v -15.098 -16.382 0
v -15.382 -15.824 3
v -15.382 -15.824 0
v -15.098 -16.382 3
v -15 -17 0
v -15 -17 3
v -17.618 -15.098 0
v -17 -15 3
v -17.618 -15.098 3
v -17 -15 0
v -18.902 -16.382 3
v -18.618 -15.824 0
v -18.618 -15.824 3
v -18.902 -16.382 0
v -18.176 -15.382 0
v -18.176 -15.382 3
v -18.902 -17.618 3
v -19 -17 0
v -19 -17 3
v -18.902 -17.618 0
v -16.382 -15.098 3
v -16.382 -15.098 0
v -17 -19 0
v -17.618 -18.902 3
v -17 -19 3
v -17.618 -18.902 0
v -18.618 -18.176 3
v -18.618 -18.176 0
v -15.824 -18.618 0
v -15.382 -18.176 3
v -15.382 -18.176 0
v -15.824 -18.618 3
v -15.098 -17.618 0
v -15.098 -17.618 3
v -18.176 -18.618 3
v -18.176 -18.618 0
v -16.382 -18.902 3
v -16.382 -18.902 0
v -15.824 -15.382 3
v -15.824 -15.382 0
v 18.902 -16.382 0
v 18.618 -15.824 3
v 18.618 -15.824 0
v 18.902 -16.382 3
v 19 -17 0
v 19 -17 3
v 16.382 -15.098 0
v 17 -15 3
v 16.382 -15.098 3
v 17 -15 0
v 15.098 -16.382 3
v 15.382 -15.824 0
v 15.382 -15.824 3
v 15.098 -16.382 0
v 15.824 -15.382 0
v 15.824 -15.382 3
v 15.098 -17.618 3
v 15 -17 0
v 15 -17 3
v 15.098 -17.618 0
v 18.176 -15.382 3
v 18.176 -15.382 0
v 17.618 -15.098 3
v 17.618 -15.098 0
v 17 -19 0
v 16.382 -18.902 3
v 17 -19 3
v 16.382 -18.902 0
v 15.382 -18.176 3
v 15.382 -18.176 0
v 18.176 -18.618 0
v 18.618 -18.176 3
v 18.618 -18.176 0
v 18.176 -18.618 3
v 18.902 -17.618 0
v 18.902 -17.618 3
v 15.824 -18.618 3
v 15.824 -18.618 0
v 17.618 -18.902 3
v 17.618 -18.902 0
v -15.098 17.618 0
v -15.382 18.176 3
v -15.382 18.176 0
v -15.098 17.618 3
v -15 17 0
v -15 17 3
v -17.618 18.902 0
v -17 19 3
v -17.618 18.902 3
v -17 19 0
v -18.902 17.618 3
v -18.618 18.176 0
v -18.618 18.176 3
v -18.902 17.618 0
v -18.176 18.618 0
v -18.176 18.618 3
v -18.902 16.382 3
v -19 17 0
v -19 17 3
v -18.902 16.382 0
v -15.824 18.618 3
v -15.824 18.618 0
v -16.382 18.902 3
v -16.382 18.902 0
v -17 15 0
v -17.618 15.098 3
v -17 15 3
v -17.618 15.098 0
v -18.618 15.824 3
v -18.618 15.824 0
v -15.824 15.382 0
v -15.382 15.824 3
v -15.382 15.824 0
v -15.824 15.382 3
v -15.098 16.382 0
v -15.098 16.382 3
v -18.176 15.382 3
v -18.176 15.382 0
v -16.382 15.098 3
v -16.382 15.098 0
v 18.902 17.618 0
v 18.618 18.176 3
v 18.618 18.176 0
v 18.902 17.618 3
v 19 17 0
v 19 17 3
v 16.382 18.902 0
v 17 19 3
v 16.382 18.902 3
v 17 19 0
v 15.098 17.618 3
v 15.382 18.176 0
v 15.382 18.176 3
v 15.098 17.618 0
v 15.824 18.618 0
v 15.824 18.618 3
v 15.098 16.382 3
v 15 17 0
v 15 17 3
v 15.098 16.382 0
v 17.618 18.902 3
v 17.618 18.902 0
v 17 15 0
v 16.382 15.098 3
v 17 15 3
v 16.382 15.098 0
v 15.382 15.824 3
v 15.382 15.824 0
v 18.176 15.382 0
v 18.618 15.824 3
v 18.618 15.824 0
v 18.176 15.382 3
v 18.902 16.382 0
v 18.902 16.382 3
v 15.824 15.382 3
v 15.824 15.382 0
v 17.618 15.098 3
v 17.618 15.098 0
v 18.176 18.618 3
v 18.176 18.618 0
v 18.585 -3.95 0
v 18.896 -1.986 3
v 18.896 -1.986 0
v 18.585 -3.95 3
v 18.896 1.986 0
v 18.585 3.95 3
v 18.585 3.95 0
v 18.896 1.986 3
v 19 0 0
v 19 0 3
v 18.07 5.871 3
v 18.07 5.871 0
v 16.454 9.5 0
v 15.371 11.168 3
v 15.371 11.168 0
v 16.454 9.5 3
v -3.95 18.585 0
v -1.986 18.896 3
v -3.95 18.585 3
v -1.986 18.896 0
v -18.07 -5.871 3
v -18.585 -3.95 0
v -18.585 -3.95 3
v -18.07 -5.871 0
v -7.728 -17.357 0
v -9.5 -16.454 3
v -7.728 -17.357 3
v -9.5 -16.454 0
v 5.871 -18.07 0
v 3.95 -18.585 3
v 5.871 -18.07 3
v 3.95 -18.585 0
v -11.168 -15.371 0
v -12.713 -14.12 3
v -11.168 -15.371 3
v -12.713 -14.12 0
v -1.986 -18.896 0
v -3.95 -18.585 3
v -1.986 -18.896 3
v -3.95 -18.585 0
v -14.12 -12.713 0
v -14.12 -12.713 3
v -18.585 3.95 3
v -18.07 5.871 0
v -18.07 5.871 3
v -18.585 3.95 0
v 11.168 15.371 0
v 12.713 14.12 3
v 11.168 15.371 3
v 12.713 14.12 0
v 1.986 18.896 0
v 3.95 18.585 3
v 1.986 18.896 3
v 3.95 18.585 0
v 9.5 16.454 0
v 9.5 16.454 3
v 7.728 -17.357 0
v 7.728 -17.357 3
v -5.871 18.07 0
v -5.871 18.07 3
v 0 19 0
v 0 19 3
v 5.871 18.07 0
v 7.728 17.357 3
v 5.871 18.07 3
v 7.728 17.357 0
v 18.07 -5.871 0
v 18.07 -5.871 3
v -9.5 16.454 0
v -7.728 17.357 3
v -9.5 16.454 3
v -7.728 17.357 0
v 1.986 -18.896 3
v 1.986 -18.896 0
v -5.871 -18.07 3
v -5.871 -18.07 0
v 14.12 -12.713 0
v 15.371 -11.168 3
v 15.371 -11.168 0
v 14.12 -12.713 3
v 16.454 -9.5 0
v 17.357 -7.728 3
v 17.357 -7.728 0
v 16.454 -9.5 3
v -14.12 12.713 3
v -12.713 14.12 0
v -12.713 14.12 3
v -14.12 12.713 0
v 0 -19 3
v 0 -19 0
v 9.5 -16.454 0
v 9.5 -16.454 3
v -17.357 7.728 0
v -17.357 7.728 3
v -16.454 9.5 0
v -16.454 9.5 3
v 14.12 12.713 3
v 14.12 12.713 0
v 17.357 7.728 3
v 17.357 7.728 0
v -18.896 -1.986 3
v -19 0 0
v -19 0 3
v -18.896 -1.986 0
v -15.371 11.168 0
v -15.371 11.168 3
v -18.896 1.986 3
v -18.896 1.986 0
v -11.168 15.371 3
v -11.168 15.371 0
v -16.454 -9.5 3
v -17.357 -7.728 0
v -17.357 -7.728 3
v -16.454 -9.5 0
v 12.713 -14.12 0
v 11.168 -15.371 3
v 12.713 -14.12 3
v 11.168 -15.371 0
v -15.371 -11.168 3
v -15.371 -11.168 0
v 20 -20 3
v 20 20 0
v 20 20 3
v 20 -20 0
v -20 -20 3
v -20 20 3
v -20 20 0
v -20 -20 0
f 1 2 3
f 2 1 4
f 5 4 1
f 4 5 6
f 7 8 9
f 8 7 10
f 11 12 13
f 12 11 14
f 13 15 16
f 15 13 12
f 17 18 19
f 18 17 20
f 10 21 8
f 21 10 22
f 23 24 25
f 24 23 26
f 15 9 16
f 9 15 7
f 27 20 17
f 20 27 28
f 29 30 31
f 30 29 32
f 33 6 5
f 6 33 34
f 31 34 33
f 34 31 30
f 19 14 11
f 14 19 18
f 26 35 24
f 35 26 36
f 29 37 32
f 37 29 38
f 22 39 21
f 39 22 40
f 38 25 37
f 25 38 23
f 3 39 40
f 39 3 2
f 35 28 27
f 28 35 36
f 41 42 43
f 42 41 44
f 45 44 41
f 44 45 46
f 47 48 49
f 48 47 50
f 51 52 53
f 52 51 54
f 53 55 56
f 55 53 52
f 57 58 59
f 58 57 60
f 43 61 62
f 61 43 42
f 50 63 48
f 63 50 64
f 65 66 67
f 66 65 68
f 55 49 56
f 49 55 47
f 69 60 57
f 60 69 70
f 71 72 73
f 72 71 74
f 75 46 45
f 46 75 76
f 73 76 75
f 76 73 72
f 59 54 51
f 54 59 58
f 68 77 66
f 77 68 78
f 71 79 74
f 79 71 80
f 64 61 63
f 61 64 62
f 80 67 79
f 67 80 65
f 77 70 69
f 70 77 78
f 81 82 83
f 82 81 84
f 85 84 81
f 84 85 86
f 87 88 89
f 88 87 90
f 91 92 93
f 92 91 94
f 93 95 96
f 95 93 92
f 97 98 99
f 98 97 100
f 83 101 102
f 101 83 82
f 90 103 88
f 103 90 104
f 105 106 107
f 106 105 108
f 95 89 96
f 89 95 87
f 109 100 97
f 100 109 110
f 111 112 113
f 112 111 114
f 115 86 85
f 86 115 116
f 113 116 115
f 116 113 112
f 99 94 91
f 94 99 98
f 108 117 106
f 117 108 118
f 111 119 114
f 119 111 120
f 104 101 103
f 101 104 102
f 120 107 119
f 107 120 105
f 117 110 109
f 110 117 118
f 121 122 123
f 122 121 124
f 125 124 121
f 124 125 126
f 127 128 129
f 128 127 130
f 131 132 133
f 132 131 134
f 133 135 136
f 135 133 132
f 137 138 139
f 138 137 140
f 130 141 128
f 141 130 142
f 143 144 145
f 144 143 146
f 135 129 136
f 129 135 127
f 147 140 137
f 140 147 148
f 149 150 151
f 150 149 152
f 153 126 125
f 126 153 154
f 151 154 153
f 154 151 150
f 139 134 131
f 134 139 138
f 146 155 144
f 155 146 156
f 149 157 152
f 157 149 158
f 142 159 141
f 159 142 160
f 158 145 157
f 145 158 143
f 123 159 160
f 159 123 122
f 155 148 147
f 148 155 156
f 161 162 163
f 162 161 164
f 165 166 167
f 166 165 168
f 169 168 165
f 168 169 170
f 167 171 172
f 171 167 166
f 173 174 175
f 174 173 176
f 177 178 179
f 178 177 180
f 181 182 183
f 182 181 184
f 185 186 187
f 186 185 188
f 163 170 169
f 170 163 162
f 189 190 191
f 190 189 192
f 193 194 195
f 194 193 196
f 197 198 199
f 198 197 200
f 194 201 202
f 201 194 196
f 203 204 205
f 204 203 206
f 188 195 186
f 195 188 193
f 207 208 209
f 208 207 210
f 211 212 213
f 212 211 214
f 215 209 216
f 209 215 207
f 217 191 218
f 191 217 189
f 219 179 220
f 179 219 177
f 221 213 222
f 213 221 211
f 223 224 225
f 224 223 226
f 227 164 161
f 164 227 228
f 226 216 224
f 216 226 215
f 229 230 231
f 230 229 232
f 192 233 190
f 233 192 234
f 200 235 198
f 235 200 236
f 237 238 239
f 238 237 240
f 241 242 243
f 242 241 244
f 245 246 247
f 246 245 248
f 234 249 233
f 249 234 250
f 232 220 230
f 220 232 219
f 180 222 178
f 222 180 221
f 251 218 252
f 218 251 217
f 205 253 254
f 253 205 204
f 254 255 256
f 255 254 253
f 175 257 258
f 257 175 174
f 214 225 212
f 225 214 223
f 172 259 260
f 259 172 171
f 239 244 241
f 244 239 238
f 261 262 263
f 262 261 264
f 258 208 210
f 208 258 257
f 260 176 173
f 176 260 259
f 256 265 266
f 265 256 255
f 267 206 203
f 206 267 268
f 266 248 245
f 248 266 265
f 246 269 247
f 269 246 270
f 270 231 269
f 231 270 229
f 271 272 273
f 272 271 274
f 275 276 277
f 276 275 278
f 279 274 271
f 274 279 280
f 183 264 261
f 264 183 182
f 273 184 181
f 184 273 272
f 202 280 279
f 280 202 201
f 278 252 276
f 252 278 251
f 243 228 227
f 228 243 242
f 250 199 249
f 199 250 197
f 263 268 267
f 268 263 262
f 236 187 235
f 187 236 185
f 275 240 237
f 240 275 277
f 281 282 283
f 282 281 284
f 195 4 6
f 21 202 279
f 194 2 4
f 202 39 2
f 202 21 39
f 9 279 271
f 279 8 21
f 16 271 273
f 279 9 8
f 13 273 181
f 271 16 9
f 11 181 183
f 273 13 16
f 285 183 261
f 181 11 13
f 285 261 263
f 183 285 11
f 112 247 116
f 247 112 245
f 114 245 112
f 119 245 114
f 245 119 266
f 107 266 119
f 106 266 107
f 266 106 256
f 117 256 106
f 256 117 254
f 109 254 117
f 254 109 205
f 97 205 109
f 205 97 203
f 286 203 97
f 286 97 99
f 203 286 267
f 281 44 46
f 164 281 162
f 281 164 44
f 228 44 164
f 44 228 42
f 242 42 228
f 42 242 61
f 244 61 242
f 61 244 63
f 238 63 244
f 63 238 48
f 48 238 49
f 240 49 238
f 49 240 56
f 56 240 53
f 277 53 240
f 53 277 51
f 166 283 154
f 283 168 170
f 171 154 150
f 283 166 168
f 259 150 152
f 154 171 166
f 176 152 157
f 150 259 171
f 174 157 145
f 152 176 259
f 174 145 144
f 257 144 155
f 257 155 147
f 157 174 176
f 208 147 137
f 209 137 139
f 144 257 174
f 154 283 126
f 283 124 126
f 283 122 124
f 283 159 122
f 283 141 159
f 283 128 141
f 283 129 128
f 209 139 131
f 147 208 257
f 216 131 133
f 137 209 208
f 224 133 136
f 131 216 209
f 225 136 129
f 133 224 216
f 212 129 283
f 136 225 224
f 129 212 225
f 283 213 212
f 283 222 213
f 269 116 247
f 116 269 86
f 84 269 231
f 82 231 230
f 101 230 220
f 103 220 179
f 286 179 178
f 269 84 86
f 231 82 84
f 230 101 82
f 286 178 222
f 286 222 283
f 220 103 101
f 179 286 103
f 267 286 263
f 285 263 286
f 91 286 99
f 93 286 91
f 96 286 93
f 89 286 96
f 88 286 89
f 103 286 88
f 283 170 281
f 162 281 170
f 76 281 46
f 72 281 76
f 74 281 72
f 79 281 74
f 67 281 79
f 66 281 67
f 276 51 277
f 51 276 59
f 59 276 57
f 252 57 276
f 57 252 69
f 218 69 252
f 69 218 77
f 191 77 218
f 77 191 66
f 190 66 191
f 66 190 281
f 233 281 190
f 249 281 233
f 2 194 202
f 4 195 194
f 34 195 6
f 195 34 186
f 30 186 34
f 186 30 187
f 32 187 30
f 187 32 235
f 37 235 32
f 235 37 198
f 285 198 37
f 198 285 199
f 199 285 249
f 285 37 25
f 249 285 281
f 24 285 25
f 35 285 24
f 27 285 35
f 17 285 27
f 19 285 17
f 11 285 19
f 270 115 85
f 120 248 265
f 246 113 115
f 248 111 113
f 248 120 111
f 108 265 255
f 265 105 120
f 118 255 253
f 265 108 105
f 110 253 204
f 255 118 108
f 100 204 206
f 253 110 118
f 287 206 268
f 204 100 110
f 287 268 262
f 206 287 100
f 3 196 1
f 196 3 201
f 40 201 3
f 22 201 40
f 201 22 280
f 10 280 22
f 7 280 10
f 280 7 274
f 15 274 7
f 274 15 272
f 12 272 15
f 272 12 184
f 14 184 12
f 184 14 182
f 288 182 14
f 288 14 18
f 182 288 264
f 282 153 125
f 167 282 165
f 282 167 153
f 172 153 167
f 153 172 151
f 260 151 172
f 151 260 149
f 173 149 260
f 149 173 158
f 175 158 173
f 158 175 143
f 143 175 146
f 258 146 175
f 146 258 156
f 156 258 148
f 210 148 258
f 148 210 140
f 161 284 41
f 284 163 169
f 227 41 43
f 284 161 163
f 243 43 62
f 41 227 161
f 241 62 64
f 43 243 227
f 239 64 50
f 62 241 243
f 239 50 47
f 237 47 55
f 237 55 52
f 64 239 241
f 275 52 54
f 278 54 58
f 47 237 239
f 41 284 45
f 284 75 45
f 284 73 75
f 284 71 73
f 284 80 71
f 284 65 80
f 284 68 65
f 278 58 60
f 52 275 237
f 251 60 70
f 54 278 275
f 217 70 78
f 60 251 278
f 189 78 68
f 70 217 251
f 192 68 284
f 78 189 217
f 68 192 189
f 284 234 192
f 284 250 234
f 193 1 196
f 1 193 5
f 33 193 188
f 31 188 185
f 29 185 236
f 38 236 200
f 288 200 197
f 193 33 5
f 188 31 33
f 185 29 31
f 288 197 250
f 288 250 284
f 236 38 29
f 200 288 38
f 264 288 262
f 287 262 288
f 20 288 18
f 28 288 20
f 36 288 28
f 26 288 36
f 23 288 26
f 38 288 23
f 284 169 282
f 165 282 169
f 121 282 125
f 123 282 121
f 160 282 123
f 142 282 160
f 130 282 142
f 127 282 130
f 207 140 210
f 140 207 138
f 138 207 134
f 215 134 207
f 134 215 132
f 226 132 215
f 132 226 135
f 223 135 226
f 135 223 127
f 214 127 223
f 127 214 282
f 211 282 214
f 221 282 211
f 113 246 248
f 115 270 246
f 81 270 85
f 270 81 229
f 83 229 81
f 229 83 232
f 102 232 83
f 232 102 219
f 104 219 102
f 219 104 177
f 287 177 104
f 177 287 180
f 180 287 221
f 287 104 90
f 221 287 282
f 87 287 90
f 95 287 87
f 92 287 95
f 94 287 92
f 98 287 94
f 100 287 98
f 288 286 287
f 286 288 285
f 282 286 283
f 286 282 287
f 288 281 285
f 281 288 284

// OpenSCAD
// file: ../math/vect.scad
function vect_scalar_sum(v, incr) = [for (i = [0: len(v) - 1]) v[i] + incr];

function vSize(size) = (!is_list(size)) ? [size, size, size]: size; 
// file: ../math/align.scad
use <vect.scad>
module align_center(sizes, center = true, centerZ = false){
    sizes = vSize(sizes);
    if (center){
        translate([-sizes[0] / 2, -sizes[1] / 2, (centerZ ? -sizes[2]/2 : 0)]){
            children();
        }
    } else {
        children();
    }   
}

module align_uncenter(sizes, uncenter = true, uncenterZ = false){
    sizes = vSize(sizes);
    if (uncenter){
        translate([sizes[0] / 2, sizes[1] / 2, (centerZ ? sizes[2]/2 : 0)]){
            children();
        }
    } else {
        children();
    }   
}


// align_center(20){
//     align_uncenter(20){
//         cube(20);
//     }
// }
// main file
h = 50;
poly_n = 20;
use <../math/align.scad>;

module cooler_screw_holes(sizes, hole_d, height = h){
    r = hole_d / 2;
    align_center(sizes){
        translate([r, r, 0]){
            cylinder(sizes[2], r1 = r, r2 = r, center = false, $fn=poly_n);
        }
        translate([sizes[0] - r, r, 0]){
            cylinder(sizes[2], r1 = r, r2 = r, center = false, $fn=poly_n);
        }
        translate([r, sizes[1] - r, 0]){
            cylinder(sizes[2], r1 = r, r2 = r, center = false, $fn=poly_n);
        }
        translate([sizes[0] - r, sizes[1] - r, 0]){
            cylinder(sizes[2], r1 = r, r2 = r, center = false, $fn=poly_n);
        }
    }
}


function _map_sizes(size) =
    (size == 40) ? [38, 38, 4]:
    (size == 50) ? [48, 48, 4]: -1;

module cooler_main_hole(r){
    cylinder(h, r / 2, r / 2, $fn=poly_n * 3);
}

module standard_cooler_screw_holes(size){
    size = _map_sizes(size);
    group(){
        cooler_screw_holes([size[0], size[0], h], size[2]);
        cooler_main_hole(size[1]);
    }
}

module standard_cooler_plate(size, h=3){
    difference(){
        align_center(size){
            cube([size, size, h]);
        }
        translate([0,0, -1]){
            standard_cooler_screw_holes(size);
        }
    }
}

standard_cooler_plate(40);
